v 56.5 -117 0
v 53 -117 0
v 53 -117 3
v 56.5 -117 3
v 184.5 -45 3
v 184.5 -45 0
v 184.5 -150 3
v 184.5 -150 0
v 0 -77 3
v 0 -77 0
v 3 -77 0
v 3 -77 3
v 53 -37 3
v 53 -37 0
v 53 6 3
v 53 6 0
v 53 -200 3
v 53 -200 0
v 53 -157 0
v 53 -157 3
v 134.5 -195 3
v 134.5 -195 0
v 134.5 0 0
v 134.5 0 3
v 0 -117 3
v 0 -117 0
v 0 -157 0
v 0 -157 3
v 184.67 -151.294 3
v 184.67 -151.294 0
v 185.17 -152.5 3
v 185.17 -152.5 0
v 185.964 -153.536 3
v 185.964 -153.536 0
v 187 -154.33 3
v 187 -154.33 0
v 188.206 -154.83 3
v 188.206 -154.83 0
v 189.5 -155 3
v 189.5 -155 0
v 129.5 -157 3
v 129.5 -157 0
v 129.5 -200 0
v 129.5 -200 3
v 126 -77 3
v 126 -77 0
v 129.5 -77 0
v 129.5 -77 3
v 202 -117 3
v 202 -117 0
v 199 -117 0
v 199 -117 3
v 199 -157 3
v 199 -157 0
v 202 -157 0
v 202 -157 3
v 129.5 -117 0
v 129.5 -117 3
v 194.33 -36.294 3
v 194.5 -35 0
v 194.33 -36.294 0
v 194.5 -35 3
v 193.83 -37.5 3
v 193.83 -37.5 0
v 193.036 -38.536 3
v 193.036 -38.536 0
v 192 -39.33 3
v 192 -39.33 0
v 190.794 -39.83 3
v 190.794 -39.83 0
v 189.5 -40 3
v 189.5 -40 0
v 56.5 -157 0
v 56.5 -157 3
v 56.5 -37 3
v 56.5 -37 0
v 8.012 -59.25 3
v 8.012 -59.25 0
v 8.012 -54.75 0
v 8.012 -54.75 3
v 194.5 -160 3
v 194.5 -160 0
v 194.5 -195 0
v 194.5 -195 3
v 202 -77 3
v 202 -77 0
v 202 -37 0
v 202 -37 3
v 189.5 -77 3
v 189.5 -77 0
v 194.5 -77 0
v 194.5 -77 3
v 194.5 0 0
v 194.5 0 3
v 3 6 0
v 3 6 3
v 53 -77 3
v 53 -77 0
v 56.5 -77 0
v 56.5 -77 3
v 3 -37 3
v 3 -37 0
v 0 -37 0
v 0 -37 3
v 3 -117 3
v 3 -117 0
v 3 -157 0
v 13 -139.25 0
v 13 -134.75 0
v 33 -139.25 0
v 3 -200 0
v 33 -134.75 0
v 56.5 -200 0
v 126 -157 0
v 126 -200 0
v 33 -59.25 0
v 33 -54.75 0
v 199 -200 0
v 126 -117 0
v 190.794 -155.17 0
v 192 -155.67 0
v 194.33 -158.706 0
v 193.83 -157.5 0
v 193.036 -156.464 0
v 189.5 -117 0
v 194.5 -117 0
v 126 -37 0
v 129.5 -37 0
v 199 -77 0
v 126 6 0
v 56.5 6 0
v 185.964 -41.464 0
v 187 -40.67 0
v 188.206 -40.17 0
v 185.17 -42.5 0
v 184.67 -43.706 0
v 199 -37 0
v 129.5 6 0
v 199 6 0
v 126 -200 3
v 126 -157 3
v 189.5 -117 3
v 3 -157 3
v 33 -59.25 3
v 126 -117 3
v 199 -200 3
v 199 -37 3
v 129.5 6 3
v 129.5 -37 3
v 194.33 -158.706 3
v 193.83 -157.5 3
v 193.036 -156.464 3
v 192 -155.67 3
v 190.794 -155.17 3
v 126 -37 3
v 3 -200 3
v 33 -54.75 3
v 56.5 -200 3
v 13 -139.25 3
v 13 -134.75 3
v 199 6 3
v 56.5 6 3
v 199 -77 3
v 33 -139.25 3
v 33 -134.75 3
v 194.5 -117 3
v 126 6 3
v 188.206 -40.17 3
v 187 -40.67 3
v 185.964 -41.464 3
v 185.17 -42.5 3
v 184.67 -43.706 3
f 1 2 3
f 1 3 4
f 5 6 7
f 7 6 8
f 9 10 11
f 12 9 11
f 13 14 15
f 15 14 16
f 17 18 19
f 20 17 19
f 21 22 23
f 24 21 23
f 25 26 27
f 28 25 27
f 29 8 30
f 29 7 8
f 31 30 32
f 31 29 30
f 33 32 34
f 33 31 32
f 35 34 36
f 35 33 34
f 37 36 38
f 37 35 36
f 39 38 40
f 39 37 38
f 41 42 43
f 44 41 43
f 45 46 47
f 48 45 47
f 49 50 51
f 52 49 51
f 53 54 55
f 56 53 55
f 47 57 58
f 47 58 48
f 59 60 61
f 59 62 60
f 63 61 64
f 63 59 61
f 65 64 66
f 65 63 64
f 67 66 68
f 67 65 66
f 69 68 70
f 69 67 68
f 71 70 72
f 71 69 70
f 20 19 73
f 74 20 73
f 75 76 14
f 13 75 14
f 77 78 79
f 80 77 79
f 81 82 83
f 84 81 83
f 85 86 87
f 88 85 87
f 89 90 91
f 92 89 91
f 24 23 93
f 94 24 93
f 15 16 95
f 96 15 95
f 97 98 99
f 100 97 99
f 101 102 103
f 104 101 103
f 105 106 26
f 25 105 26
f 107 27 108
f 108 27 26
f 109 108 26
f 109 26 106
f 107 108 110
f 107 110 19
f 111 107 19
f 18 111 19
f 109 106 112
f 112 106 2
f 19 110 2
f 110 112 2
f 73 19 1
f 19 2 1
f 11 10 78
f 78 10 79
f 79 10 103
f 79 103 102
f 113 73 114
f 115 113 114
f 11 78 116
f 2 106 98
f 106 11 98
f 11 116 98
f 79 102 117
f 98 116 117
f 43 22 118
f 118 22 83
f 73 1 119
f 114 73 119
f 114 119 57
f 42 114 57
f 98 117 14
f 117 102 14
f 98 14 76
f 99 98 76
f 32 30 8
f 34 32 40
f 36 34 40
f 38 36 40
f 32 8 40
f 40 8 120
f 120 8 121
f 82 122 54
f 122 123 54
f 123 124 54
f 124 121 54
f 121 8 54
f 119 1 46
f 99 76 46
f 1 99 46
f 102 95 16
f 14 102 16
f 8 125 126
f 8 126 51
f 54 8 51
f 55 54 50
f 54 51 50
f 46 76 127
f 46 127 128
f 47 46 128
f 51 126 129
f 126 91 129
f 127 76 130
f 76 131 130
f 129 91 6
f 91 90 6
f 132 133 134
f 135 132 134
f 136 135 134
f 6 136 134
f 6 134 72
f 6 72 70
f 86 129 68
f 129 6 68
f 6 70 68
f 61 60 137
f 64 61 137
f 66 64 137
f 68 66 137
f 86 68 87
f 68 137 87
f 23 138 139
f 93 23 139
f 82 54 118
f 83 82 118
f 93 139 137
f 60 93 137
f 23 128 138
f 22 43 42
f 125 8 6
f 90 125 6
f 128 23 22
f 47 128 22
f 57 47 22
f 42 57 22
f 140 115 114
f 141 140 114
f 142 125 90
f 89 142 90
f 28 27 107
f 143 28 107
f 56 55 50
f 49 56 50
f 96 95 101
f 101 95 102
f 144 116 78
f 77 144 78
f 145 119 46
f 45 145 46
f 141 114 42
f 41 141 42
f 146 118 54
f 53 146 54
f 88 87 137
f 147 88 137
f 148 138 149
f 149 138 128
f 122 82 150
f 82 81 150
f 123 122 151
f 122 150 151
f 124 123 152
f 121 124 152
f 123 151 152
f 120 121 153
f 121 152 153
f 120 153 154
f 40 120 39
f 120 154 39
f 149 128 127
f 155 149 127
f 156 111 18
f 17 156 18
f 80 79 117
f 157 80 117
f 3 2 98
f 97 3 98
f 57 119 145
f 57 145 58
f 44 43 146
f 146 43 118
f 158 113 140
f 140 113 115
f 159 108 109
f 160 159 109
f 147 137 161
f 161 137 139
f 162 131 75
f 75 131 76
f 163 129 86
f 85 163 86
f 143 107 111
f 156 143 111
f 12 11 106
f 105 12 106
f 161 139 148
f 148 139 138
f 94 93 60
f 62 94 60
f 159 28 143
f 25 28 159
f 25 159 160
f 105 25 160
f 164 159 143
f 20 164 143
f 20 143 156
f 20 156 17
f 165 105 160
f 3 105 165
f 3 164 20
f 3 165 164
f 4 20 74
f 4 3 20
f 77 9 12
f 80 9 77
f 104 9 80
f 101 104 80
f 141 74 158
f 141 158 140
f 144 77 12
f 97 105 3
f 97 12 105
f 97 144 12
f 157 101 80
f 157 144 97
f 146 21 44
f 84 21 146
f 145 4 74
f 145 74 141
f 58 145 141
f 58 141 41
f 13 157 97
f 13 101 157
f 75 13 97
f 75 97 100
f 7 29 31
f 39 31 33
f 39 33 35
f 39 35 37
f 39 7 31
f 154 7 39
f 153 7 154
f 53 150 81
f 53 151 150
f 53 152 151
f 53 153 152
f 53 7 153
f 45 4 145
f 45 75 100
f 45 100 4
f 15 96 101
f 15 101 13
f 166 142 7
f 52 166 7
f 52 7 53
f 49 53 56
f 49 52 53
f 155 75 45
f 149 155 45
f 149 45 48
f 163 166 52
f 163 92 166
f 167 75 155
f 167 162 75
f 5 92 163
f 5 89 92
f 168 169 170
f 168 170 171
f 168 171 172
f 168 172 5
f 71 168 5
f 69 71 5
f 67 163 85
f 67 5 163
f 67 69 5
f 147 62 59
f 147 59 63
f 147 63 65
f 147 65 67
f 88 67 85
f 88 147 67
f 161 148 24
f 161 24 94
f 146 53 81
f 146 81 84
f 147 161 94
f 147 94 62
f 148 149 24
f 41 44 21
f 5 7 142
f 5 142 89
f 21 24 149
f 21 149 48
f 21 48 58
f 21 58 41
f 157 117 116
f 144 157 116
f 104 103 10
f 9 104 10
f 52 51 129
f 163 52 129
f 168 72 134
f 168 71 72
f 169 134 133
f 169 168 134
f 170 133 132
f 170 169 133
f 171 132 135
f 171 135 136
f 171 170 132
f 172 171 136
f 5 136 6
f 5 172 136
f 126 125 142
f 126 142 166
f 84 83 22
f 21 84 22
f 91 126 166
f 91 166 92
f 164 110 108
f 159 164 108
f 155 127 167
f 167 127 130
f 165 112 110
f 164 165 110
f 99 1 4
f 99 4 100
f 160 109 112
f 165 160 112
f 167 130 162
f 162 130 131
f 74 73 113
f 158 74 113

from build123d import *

# Parameters (mm, degrees)
F0_W     = 3.5
F0_H     = 40
F0_W_2   = 5
F1_DEPTH = 3
F2_R     = 4.99999
F3_R     = 4.99999


# Not quite as in the source:
# - a fillet or chamfer is up to 0.001 mm smaller than in the source, because OpenCascade refuses the exact size


with BuildPart() as f1:
    # F0 (on Top) → F1 (new body)
    with BuildSketch(Plane.XY):
        Polygon((129.5, -200), (199, -200), (199, -157), (202, -157), (202, -117), (199, -117), (199, -77), (202, -77), (202, -37), (199, -37), (199, 6), (129.5, 6), (129.5, -37), (126, -37), (126, 6), (56.5, 6), (56.5, -37), (53, -37), (53, 6), (3, 6), (3, -37), (0, -37), (0, -77), (3, -77), (3, -117), (0, -117), (0, -157), (3, -157), (3, -200), (53, -200), (53, -157), (56.5, -157), (56.5, -200), (126, -200), (126, -157), (129.5, -157), align=None)
        Polygon((33, -134.75), (33, -137), (33, -139.25), (13, -139.25), (13, -134.75), align=None, mode=Mode.SUBTRACT)
        with Locations((54.75, -97)):
            Rectangle(F0_W, F0_H, mode=Mode.SUBTRACT)
        with Locations((127.75, -97)):
            Rectangle(F0_W, F0_H, mode=Mode.SUBTRACT)
        Polygon((134.5, -195), (134.5, -97), (134.5, 0), (194.5, 0), (194.5, -40), (184.5, -40), (184.5, -155), (194.5, -155), (194.5, -195), align=None, mode=Mode.SUBTRACT)
        with Locations((192, -97)):
            Rectangle(F0_W_2, F0_H, mode=Mode.SUBTRACT)
        Polygon((33, -54.75), (33, -57), (33, -59.25), (8.0116633326, -59.25), (8.0116633326, -54.75), align=None, mode=Mode.SUBTRACT)
    extrude(amount=F1_DEPTH)

    # F2 (radius 5 in the source; OpenCascade refuses exactly that, so slightly less here)
    f2_edges = [f1.edges().sort_by_distance(p)[0] for p in [
        (194.5, -40, 1.5),
        (184.5, -40, 1.5),
    ]]
    fillet(f2_edges, radius=F2_R)

    # F3 (radius 5 in the source; OpenCascade refuses exactly that, so slightly less here)
    f3_edges = [f1.edges().sort_by_distance(p)[0] for p in [
        (194.5, -155, 1.5),
        (184.5, -155, 1.5),
    ]]
    fillet(f3_edges, radius=F3_R)


solid = f1.part
